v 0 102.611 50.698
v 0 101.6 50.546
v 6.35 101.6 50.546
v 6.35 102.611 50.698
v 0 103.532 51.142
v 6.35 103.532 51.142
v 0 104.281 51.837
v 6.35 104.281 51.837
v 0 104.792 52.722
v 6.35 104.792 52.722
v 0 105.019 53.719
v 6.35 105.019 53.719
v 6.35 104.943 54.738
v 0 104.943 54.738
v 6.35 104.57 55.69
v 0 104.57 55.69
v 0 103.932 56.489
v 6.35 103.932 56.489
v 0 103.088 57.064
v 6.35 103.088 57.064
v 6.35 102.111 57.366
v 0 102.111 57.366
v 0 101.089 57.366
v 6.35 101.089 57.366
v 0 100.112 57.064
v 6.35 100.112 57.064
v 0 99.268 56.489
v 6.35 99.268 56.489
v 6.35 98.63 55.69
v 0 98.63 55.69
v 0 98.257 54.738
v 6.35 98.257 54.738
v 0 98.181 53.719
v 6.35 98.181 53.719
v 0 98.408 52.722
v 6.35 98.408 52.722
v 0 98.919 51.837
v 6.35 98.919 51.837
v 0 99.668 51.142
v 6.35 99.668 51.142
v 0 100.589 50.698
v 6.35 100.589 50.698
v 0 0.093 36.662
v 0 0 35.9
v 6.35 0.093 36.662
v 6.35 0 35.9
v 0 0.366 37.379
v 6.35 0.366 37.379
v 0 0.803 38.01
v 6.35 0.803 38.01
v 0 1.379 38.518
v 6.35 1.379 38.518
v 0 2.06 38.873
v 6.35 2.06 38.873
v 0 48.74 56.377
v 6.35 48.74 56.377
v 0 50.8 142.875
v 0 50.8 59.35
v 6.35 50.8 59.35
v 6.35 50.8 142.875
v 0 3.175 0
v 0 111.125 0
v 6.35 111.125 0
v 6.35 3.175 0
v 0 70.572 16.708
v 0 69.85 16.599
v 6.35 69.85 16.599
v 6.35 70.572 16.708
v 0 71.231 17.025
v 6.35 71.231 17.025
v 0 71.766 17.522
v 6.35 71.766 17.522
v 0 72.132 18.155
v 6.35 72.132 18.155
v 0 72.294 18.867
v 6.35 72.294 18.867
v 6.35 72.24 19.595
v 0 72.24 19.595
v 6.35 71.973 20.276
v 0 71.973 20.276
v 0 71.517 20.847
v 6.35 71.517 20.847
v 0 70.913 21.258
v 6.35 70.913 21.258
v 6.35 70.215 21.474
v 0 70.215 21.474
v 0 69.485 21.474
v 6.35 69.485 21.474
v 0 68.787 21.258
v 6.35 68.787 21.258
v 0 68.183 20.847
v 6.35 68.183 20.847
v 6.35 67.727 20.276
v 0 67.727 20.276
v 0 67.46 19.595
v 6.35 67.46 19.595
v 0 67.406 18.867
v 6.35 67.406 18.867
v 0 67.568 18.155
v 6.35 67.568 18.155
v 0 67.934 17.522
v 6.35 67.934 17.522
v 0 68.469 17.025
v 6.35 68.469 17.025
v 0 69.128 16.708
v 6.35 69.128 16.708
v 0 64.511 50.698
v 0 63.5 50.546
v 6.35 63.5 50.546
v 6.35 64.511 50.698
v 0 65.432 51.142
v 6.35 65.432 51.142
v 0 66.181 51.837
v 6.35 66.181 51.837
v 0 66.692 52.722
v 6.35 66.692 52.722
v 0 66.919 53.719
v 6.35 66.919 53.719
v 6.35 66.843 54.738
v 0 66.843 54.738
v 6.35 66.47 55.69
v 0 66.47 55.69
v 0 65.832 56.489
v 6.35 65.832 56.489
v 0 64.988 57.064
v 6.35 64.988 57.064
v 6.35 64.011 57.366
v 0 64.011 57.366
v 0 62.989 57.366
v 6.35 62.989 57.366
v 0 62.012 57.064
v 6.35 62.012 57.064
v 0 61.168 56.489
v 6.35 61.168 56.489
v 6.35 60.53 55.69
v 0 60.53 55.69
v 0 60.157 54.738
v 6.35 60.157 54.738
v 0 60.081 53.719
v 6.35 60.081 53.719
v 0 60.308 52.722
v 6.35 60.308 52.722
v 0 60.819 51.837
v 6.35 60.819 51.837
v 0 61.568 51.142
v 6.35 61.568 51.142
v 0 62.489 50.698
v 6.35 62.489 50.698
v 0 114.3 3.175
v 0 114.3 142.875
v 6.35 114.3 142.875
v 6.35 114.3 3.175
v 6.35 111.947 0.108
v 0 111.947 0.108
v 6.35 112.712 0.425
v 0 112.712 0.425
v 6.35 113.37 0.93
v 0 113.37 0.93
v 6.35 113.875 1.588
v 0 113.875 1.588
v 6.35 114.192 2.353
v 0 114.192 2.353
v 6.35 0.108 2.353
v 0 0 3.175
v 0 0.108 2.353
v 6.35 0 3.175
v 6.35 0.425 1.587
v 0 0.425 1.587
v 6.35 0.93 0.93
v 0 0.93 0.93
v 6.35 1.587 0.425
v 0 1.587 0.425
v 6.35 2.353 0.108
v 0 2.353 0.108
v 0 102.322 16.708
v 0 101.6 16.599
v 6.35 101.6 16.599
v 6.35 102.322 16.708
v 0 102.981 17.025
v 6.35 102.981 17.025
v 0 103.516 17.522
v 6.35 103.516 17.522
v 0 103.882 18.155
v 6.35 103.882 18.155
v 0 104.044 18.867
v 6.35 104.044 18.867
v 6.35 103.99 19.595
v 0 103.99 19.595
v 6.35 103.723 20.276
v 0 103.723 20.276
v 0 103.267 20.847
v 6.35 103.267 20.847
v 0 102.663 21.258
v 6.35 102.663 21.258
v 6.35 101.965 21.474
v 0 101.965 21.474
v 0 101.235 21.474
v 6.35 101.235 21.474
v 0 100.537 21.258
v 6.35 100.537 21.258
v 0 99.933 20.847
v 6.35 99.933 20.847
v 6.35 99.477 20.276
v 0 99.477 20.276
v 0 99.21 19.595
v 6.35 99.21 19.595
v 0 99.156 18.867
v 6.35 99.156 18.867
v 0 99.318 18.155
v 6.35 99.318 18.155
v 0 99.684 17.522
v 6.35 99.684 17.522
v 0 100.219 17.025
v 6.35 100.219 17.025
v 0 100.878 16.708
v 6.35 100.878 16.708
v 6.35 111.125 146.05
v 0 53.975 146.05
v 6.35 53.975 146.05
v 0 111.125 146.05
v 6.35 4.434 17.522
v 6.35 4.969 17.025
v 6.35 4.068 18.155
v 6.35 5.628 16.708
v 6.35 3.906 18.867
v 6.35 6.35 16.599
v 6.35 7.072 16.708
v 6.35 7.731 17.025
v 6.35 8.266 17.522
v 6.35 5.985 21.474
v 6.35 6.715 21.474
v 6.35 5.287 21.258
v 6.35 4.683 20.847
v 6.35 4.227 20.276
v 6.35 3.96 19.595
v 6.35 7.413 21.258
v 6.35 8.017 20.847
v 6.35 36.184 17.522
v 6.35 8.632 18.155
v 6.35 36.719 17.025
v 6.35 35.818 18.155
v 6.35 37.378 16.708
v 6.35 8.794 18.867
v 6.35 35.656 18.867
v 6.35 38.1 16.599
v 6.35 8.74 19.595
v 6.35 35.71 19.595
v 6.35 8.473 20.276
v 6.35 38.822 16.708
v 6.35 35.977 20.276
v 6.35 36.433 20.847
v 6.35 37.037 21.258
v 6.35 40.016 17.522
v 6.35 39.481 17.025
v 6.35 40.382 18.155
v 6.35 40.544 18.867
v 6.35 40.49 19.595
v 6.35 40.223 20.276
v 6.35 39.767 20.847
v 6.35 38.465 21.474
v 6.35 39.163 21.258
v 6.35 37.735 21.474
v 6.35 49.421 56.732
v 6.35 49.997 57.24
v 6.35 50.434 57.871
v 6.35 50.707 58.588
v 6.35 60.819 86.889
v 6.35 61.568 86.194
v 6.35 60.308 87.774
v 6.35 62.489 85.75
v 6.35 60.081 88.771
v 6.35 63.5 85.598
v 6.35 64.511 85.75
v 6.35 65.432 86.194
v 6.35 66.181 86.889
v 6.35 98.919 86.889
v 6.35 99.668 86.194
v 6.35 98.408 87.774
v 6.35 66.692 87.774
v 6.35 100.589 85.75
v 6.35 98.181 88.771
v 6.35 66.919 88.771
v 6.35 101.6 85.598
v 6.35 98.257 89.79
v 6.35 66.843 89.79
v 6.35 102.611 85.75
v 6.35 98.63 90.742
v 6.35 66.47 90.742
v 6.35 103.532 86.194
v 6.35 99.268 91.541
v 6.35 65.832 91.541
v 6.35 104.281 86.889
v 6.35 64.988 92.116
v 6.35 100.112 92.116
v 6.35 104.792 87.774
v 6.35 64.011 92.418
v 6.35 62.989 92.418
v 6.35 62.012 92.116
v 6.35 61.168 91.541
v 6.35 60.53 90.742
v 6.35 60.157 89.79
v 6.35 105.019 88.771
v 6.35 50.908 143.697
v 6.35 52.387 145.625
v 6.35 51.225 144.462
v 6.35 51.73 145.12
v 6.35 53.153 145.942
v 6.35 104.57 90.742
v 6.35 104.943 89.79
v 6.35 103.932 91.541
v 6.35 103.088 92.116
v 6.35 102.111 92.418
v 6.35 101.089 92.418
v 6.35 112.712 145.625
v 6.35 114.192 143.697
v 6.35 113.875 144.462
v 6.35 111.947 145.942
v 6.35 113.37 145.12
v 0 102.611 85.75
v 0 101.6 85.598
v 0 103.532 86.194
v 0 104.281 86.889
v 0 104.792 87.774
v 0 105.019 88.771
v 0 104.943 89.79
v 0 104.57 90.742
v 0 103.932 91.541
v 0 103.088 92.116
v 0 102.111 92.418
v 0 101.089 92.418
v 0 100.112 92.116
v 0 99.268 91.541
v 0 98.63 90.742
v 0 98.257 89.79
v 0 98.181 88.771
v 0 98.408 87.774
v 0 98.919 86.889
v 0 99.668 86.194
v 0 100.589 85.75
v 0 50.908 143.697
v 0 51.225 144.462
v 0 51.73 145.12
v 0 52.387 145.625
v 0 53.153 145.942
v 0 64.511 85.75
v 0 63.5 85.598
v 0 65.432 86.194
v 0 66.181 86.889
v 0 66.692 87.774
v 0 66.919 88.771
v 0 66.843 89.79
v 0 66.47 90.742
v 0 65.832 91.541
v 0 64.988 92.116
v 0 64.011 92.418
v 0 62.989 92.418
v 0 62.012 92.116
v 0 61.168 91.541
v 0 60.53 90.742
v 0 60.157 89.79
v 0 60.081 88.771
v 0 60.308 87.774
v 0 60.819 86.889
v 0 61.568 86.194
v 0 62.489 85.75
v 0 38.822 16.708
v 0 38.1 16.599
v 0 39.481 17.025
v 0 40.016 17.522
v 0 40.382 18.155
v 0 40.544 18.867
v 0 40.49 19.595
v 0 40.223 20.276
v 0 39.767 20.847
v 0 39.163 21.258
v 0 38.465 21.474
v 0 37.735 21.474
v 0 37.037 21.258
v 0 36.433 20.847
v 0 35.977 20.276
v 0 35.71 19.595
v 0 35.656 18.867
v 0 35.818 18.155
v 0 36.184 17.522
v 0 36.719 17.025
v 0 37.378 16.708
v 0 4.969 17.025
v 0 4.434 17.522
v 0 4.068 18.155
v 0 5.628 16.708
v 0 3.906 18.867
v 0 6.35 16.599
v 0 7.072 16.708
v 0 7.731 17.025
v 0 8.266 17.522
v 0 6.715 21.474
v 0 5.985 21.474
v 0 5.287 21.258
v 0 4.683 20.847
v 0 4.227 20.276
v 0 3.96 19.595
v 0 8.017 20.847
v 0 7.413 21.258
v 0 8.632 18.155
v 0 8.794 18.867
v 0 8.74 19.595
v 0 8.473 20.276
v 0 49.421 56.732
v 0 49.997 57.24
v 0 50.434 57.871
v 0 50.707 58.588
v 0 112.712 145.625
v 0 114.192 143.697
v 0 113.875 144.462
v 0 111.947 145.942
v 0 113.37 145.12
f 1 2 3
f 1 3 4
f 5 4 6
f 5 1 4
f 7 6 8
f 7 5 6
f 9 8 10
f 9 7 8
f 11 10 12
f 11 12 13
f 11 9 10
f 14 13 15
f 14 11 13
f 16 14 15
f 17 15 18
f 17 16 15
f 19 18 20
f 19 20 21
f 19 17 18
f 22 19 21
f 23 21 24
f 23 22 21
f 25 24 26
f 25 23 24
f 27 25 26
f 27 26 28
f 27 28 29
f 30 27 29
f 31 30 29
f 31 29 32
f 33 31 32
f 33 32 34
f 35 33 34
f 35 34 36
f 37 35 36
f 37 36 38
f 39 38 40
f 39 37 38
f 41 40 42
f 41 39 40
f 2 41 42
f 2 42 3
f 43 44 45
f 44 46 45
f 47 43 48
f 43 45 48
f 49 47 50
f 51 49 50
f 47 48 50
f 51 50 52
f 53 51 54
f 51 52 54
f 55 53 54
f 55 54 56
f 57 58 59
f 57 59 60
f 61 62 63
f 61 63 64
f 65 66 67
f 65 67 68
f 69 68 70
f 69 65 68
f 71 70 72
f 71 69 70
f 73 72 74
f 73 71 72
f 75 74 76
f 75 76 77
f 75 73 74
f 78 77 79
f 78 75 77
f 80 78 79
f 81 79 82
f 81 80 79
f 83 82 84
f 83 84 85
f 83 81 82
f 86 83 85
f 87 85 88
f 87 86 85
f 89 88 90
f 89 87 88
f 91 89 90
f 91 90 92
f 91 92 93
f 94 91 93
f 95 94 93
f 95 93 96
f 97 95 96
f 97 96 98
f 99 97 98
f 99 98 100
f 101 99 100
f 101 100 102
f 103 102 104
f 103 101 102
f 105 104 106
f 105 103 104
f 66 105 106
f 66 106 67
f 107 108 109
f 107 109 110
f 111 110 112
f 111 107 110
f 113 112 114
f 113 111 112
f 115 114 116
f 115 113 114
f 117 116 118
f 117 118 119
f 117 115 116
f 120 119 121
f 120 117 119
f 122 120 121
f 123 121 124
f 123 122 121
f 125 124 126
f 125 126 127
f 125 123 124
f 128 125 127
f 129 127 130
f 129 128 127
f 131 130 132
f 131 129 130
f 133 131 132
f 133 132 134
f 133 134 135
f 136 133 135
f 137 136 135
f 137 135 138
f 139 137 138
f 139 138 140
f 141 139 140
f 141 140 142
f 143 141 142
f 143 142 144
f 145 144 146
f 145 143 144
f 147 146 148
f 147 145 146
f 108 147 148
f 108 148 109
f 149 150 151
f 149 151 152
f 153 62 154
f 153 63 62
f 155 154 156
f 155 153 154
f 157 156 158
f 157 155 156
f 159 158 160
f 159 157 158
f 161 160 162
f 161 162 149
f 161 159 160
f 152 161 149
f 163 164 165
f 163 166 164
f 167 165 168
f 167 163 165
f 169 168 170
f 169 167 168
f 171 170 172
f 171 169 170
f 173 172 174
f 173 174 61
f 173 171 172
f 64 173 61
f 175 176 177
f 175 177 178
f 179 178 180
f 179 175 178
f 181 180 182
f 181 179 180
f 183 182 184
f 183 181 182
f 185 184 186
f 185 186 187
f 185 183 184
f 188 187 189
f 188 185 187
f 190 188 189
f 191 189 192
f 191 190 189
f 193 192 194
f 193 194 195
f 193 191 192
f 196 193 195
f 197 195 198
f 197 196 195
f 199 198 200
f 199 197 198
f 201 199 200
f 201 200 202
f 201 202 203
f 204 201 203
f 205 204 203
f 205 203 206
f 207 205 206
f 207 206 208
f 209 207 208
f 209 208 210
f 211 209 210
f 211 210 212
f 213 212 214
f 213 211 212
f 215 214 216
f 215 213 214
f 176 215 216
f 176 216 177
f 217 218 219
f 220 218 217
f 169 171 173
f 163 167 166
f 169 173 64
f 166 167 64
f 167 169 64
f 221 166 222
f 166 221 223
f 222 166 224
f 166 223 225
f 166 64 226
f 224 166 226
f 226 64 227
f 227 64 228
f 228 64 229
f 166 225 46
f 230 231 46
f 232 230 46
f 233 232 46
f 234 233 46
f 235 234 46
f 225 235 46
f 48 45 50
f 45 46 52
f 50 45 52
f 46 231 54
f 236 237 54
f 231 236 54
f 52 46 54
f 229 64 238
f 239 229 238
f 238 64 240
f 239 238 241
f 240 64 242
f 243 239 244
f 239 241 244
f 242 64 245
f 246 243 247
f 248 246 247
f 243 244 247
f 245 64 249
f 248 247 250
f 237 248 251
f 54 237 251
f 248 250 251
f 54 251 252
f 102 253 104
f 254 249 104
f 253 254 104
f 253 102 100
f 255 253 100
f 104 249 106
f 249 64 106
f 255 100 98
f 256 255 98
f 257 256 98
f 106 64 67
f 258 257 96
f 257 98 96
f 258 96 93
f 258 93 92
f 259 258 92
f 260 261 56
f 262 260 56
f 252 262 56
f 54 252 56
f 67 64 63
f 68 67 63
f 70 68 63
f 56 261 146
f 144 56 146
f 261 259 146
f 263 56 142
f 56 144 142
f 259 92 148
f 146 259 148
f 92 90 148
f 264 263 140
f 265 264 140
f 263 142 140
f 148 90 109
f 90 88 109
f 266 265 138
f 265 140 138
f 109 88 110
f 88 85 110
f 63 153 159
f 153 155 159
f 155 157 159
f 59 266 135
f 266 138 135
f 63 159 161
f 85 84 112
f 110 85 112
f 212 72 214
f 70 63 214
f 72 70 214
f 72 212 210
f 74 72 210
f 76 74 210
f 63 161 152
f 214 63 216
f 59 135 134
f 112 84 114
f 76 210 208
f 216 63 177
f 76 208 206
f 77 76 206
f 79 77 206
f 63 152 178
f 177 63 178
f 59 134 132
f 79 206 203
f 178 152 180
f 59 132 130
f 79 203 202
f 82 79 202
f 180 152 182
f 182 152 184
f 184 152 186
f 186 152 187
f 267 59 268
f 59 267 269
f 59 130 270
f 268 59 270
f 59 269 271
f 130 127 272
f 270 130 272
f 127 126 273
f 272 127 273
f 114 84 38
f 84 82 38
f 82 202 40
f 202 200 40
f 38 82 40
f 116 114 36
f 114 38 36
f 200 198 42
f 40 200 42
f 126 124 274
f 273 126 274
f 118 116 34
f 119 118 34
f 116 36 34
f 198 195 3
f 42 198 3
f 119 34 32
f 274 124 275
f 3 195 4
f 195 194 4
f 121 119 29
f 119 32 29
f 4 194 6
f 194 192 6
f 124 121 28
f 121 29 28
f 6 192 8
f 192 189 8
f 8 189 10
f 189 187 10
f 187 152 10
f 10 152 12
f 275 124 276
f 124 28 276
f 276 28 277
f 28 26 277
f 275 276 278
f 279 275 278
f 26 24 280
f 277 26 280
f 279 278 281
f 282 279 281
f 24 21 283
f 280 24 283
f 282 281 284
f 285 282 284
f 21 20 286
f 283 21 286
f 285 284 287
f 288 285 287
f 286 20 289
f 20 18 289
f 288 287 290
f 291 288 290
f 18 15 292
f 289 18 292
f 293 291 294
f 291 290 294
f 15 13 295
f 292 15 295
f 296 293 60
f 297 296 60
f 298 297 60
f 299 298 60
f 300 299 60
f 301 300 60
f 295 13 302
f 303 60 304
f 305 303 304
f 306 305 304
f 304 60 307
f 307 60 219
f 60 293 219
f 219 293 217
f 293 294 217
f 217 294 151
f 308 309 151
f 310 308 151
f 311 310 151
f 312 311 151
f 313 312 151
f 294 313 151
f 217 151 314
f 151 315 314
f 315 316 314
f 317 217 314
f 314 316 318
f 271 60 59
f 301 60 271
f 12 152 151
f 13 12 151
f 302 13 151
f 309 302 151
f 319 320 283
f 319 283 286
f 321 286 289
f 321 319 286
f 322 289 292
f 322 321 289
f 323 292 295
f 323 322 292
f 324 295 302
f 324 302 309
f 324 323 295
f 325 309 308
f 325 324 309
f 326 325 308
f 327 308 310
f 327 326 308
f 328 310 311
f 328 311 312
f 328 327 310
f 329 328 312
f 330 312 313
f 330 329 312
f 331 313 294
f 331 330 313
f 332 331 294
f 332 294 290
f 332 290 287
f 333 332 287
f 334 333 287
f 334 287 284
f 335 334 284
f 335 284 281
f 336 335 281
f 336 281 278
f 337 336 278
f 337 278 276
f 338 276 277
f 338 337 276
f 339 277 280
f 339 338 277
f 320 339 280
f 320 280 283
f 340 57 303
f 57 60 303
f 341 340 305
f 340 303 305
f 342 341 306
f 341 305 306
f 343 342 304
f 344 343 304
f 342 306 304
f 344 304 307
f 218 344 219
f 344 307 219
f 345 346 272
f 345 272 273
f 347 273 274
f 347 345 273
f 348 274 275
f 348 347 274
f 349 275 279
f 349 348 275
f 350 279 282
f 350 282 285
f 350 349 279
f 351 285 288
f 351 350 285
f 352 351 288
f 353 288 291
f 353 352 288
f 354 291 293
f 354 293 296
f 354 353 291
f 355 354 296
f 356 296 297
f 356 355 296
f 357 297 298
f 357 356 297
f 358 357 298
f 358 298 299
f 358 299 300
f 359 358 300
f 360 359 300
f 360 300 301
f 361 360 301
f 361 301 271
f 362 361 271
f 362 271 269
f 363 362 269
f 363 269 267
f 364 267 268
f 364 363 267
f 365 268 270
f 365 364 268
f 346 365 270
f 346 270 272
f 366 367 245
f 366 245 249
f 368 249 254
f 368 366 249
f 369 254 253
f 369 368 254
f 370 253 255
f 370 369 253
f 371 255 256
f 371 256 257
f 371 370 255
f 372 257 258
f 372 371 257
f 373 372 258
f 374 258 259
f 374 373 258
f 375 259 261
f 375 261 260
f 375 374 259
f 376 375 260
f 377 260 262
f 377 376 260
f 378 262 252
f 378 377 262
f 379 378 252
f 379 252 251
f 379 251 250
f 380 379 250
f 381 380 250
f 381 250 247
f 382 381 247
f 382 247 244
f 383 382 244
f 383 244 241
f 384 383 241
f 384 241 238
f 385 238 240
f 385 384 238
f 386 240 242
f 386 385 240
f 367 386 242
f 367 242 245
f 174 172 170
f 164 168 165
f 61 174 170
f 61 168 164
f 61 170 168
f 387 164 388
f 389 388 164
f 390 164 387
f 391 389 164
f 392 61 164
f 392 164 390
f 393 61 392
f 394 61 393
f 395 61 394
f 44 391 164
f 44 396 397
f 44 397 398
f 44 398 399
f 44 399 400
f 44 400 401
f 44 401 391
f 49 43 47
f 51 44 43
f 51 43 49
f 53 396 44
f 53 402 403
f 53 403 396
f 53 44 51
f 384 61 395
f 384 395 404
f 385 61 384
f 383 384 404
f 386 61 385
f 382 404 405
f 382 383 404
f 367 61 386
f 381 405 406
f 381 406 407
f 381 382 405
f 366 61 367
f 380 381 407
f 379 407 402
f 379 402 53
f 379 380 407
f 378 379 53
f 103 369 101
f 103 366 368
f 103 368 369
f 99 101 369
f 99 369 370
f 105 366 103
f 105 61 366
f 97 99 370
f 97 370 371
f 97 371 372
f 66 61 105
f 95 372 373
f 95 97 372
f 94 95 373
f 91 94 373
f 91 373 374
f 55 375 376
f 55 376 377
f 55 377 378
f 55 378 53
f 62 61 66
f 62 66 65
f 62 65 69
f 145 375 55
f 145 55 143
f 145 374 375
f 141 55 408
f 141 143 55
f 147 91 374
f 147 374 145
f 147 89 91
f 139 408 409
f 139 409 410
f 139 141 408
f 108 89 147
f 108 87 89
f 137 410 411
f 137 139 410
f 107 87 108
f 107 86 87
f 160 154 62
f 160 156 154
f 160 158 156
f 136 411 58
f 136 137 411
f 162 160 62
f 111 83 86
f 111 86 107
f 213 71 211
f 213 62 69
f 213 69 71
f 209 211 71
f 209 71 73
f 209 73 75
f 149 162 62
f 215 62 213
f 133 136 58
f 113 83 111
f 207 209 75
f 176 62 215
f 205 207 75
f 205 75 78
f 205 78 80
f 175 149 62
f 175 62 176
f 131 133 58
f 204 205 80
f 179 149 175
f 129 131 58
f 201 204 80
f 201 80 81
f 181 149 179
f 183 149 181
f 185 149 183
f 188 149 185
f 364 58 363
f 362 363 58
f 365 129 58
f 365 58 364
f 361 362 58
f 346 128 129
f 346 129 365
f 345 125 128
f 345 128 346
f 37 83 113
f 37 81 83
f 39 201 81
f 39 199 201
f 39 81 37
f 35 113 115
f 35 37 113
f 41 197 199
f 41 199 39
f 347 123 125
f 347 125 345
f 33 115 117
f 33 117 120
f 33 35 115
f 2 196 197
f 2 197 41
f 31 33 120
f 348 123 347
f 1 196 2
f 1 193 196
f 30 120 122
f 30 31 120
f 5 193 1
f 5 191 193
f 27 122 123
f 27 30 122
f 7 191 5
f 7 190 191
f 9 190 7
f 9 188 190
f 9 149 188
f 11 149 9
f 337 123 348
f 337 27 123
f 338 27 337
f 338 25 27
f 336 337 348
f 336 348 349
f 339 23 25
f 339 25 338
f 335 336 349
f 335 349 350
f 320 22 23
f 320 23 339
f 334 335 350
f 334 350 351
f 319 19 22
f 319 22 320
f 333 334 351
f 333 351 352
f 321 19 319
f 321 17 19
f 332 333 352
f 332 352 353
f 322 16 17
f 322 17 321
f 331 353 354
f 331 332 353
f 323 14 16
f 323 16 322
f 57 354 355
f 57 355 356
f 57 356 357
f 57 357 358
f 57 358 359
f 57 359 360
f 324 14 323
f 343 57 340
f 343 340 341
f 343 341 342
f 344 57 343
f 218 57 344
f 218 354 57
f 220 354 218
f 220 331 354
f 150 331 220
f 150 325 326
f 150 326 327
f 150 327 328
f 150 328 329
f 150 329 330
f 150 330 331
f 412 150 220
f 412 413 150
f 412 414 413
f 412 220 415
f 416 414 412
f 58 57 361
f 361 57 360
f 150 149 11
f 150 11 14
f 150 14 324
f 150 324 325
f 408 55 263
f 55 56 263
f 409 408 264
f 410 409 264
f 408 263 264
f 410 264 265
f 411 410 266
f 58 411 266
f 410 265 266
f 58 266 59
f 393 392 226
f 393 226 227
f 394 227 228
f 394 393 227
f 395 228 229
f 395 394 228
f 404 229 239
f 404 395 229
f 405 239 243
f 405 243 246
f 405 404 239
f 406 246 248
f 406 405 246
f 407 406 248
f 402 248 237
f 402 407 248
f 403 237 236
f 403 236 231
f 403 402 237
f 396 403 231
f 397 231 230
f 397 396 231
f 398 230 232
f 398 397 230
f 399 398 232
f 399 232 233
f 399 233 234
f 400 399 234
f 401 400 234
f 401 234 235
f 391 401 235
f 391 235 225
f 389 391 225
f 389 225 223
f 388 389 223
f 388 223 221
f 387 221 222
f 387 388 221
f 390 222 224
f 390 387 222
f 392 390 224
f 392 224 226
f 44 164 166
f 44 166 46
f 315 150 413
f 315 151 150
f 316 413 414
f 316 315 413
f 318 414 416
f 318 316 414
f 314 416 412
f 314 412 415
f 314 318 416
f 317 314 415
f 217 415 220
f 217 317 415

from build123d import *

# Parameters (mm, degrees)
SKETCH1_R           = 2.4511
SKETCH1_R_2         = 3.429
BOSS_EXTRUDE1_DEPTH = 6.35
FILLET1_R           = 3.175


with BuildPart() as part:
    # Sketch1 → Boss-Extrude1 (new body)
    with BuildSketch(Plane(origin=(0, 0, 0), x_dir=(0, 0, -1), z_dir=(1, 0, 0))):
        Polygon((0, 0), (-38.1, 0), (-57.15, 50.8), (-146.05, 50.8), (-146.05, 114.3), (0, 114.3), align=None)
        with Locations((-19.05, 101.6)):
            Circle(SKETCH1_R, mode=Mode.SUBTRACT)
        with Locations((-19.05, 69.85)):
            Circle(SKETCH1_R, mode=Mode.SUBTRACT)
        with Locations((-19.05, 38.1)):
            Circle(SKETCH1_R, mode=Mode.SUBTRACT)
        with Locations((-19.05, 6.35)):
            Circle(SKETCH1_R, mode=Mode.SUBTRACT)
        with Locations((-53.975, 101.6)):
            Circle(SKETCH1_R_2, mode=Mode.SUBTRACT)
        with Locations((-89.027, 101.6)):
            Circle(SKETCH1_R_2, mode=Mode.SUBTRACT)
        with Locations((-89.027, 63.5)):
            Circle(SKETCH1_R_2, mode=Mode.SUBTRACT)
        with Locations((-53.975, 63.5)):
            Circle(SKETCH1_R_2, mode=Mode.SUBTRACT)
    extrude(amount=BOSS_EXTRUDE1_DEPTH)

    # Fillet1
    fillet1_edges = [part.edges().sort_by_distance(p)[0] for p in [
        (3.175, 0, 0),
        (3.175, 0, 38.1),
        (3.175, 50.8, 57.15),
        (3.175, 50.8, 146.05),
        (3.175, 114.3, 146.05),
        (3.175, 114.3, 0),
    ]]
    fillet(fillet1_edges, radius=FILLET1_R)


solid = part.part
